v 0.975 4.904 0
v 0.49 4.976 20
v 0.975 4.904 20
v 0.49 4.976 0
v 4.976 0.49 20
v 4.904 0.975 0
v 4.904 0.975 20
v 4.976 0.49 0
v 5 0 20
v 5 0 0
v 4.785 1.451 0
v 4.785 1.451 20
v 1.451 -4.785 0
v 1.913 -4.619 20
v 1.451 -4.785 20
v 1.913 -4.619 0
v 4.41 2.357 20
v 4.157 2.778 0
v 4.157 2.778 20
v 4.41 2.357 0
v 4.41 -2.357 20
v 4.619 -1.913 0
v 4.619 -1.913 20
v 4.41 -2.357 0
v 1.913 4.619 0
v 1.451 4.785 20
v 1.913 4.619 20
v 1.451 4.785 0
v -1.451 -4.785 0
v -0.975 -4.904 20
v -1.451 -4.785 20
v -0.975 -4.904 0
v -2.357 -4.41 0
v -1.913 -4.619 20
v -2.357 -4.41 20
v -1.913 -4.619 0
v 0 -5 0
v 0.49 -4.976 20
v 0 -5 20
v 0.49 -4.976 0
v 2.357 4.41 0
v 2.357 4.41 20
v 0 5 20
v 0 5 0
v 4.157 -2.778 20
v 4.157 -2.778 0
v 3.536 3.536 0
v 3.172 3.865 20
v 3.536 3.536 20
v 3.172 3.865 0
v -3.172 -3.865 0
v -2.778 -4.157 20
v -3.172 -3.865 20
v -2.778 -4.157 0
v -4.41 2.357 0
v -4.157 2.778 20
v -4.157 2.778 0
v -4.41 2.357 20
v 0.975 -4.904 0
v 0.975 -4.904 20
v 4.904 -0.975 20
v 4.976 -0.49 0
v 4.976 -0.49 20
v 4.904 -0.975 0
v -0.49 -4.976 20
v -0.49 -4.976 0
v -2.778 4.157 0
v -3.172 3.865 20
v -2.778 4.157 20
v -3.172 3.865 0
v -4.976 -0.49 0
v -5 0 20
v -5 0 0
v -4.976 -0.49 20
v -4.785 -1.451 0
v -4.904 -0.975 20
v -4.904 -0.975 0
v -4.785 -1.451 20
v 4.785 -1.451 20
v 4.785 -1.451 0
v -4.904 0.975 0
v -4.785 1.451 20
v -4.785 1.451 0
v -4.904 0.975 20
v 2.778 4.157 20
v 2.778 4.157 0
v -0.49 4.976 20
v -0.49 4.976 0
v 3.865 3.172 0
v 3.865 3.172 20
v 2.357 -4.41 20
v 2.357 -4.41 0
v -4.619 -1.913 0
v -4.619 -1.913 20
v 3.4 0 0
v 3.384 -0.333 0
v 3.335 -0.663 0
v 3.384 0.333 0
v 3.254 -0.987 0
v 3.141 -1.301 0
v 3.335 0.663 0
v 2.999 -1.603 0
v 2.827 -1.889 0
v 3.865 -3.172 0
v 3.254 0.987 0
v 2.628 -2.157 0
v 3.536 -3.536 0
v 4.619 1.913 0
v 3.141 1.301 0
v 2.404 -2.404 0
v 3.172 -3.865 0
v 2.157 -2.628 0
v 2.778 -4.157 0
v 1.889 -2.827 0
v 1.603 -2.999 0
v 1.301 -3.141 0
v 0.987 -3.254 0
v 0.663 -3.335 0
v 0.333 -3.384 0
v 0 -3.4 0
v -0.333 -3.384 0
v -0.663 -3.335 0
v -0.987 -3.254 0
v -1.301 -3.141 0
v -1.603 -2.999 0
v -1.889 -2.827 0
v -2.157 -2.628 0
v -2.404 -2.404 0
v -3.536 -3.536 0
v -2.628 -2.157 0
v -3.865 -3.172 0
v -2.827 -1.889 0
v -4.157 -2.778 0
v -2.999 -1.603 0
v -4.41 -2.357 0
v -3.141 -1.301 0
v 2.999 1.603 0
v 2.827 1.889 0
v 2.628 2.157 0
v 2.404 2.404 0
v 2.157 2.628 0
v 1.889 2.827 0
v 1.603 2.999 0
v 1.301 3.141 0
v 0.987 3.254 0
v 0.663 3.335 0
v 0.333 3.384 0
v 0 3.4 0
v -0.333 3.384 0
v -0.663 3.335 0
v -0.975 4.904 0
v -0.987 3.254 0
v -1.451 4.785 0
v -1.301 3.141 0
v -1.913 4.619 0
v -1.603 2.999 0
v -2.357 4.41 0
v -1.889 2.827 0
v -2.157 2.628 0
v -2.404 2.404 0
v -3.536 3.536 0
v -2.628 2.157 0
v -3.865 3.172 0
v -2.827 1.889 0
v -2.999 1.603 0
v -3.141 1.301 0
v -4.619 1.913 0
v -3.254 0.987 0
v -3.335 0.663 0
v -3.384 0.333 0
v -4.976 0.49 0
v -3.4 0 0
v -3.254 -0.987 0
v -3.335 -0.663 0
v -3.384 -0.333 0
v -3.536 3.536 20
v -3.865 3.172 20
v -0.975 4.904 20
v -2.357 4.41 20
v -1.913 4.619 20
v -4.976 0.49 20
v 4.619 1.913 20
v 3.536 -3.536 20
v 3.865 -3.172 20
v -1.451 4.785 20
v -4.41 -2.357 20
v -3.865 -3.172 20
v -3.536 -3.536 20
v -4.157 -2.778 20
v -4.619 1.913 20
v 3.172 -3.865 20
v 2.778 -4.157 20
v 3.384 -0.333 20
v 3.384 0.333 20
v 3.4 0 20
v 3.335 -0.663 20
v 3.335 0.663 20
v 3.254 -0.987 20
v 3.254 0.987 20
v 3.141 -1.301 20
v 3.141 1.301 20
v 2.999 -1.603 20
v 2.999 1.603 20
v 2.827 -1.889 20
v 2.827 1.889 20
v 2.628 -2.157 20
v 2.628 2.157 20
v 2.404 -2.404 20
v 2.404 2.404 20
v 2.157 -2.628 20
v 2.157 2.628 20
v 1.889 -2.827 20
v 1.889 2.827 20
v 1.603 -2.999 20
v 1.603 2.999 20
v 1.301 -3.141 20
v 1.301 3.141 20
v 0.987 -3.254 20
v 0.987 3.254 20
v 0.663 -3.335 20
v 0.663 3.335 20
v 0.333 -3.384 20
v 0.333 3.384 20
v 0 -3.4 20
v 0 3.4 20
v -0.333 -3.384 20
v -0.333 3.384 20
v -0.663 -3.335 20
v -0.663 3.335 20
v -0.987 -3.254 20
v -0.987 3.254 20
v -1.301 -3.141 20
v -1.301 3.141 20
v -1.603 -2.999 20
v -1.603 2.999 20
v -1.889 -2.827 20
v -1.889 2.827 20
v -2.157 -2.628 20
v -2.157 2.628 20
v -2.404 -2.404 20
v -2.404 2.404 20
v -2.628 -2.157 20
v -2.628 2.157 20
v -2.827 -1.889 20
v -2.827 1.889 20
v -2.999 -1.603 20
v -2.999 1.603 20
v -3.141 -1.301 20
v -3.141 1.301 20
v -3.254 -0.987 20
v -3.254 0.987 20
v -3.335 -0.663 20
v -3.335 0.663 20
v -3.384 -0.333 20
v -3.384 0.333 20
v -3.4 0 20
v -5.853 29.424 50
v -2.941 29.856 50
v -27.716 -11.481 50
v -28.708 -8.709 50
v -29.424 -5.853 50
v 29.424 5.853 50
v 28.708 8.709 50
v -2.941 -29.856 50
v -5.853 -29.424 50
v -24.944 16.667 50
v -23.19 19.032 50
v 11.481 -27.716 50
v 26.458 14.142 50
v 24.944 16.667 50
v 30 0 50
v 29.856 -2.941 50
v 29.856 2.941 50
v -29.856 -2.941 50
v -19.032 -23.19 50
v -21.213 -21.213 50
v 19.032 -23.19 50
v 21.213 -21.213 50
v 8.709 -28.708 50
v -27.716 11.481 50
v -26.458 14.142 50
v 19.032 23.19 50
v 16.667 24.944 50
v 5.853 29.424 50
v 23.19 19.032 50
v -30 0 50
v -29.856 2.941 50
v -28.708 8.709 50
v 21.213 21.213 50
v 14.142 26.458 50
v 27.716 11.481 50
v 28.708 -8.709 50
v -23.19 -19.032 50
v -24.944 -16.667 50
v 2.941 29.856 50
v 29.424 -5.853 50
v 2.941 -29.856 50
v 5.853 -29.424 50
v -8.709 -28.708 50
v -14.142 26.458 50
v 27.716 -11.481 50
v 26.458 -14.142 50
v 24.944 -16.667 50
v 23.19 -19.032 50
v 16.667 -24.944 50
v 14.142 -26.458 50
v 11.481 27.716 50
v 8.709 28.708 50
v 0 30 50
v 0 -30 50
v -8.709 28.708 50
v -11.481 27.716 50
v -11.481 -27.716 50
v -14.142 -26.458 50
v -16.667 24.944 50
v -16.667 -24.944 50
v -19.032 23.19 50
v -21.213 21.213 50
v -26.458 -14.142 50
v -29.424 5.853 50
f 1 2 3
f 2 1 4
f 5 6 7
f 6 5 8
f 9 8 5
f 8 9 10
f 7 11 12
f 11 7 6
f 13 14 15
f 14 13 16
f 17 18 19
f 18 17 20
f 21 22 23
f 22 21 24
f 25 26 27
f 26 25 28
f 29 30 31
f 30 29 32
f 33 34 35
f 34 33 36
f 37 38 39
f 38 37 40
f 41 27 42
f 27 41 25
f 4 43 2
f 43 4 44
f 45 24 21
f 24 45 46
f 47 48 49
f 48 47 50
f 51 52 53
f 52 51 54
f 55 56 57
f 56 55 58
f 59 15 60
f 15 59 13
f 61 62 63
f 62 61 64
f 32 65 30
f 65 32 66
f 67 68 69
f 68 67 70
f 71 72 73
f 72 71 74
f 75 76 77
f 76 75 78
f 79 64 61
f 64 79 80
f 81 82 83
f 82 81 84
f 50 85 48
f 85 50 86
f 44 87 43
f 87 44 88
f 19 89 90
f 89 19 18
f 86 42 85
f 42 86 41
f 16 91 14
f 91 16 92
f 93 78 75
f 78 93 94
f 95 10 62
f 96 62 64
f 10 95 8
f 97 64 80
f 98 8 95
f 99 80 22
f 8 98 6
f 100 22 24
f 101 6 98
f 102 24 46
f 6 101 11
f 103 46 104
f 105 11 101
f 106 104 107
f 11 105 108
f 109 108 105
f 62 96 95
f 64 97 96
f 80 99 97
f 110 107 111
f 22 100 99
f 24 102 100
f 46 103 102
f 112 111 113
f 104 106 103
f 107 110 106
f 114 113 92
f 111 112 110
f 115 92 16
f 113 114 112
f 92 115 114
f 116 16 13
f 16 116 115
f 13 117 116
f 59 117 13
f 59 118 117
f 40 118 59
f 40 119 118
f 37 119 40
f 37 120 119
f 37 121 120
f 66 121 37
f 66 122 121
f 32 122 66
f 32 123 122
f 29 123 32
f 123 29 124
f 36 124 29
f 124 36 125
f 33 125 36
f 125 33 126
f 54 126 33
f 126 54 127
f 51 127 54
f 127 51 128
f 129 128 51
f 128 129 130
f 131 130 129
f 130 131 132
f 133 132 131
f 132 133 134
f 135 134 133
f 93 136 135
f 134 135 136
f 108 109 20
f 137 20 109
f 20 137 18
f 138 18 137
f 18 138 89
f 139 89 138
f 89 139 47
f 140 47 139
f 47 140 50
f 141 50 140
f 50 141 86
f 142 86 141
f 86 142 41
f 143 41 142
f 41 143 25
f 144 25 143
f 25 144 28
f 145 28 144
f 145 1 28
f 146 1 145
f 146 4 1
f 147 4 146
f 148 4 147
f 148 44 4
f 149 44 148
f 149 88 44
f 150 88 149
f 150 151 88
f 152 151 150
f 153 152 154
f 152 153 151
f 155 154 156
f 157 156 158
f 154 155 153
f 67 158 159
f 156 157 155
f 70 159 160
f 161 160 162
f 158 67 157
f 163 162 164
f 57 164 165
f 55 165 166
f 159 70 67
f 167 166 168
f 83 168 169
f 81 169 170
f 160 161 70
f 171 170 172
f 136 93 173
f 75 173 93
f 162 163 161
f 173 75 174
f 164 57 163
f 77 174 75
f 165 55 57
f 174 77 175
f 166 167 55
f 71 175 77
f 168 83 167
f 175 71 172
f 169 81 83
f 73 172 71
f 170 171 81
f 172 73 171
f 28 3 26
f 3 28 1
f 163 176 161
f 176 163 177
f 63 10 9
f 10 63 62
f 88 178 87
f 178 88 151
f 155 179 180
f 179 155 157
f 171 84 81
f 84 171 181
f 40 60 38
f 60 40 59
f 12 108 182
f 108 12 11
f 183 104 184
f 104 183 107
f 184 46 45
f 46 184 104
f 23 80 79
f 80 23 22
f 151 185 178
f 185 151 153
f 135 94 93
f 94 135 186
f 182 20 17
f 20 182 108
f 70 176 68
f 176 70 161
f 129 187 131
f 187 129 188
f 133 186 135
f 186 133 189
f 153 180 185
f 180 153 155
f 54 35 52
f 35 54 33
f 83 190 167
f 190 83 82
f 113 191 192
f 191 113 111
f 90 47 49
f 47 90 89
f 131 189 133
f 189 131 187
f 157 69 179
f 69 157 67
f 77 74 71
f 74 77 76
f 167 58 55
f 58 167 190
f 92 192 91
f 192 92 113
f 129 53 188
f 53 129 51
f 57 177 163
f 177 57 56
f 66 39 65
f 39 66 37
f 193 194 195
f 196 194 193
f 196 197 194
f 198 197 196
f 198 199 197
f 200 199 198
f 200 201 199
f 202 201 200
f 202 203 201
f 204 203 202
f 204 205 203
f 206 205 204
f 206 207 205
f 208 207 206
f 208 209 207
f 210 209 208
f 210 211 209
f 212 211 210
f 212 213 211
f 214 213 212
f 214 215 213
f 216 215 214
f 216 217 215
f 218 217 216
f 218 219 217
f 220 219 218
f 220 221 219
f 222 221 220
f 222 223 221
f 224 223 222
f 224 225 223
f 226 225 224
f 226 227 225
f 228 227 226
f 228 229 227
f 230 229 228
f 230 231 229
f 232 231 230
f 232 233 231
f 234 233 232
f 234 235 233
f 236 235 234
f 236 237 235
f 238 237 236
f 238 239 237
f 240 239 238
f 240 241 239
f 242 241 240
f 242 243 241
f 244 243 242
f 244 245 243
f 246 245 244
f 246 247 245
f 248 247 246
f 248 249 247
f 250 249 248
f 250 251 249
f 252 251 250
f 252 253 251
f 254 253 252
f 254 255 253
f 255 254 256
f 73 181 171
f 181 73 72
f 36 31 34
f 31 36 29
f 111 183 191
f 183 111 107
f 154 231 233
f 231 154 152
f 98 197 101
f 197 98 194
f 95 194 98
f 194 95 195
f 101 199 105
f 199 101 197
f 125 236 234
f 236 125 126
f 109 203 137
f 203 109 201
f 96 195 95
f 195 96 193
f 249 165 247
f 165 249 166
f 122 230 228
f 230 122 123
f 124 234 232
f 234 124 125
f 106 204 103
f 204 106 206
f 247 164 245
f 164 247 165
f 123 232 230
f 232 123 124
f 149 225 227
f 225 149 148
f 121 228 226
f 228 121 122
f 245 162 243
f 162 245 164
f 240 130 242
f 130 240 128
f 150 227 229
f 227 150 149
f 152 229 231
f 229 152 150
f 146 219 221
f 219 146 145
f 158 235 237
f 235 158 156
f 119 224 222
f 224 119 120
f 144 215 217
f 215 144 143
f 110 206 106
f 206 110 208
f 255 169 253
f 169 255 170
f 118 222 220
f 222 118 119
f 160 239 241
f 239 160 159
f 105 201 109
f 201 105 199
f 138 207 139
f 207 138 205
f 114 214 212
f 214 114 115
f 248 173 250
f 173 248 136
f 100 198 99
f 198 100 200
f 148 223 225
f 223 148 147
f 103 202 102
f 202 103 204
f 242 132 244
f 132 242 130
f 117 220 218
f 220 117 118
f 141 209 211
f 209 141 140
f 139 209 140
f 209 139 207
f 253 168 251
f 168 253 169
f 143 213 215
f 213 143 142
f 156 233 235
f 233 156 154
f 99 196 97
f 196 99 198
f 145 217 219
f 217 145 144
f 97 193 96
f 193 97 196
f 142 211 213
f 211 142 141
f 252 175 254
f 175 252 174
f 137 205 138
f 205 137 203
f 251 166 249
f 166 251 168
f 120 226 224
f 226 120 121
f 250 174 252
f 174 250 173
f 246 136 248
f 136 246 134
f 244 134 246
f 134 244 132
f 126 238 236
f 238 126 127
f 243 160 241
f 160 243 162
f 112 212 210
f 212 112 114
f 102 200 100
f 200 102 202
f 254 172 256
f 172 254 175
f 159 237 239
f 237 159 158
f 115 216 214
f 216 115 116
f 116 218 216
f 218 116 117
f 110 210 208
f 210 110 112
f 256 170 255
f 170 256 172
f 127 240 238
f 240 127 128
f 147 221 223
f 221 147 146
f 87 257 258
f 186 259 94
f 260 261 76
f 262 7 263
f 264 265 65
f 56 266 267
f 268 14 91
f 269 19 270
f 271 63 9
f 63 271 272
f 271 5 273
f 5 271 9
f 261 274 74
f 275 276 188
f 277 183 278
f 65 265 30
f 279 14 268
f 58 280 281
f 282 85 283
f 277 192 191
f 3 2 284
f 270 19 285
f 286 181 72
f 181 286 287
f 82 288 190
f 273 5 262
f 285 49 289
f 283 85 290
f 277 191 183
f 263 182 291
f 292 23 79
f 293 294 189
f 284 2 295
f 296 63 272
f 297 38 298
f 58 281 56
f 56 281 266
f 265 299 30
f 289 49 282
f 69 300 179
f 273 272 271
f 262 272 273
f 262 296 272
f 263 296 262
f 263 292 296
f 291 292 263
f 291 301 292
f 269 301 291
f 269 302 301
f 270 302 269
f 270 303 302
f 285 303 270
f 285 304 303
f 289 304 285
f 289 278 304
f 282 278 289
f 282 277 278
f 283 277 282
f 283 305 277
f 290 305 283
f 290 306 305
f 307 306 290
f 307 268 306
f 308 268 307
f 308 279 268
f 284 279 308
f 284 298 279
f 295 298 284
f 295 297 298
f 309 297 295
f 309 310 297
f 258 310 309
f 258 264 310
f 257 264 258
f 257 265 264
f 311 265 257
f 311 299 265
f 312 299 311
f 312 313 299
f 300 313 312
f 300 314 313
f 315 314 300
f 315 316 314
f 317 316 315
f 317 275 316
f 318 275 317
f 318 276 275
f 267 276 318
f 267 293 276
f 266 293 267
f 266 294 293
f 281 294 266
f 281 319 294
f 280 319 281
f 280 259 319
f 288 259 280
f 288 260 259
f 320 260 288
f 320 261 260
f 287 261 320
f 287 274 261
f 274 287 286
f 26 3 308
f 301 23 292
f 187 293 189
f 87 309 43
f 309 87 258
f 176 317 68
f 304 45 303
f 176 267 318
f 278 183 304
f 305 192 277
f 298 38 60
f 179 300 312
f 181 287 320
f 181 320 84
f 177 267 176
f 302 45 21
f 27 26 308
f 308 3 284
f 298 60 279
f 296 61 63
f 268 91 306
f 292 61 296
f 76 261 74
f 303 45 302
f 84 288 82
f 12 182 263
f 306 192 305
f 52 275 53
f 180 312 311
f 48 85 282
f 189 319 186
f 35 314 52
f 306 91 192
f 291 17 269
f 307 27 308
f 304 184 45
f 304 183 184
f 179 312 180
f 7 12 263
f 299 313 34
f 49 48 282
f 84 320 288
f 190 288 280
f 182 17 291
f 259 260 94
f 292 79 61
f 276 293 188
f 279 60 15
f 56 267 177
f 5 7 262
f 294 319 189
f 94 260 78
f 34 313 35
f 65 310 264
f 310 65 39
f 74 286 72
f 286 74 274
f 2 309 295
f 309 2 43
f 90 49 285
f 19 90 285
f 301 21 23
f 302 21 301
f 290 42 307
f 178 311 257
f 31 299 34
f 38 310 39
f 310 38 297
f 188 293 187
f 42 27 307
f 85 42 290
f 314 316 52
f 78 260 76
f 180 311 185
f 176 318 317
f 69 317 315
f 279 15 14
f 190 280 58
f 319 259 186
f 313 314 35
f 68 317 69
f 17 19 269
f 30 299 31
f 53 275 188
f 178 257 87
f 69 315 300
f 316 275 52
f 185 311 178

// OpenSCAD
// Built by bench/smallmodels/features/compiler.py from a list of features.
$fn = 64;
union() {
    translate([0, 0, 0]) difference() { cylinder(d = 10, h = 20); translate([0, 0, -0.01]) cylinder(d = 6.8, h = 20.02); }
    translate([0, 0, 20]) cylinder(d1 = 10, d2 = 60, h = 30);
  }
